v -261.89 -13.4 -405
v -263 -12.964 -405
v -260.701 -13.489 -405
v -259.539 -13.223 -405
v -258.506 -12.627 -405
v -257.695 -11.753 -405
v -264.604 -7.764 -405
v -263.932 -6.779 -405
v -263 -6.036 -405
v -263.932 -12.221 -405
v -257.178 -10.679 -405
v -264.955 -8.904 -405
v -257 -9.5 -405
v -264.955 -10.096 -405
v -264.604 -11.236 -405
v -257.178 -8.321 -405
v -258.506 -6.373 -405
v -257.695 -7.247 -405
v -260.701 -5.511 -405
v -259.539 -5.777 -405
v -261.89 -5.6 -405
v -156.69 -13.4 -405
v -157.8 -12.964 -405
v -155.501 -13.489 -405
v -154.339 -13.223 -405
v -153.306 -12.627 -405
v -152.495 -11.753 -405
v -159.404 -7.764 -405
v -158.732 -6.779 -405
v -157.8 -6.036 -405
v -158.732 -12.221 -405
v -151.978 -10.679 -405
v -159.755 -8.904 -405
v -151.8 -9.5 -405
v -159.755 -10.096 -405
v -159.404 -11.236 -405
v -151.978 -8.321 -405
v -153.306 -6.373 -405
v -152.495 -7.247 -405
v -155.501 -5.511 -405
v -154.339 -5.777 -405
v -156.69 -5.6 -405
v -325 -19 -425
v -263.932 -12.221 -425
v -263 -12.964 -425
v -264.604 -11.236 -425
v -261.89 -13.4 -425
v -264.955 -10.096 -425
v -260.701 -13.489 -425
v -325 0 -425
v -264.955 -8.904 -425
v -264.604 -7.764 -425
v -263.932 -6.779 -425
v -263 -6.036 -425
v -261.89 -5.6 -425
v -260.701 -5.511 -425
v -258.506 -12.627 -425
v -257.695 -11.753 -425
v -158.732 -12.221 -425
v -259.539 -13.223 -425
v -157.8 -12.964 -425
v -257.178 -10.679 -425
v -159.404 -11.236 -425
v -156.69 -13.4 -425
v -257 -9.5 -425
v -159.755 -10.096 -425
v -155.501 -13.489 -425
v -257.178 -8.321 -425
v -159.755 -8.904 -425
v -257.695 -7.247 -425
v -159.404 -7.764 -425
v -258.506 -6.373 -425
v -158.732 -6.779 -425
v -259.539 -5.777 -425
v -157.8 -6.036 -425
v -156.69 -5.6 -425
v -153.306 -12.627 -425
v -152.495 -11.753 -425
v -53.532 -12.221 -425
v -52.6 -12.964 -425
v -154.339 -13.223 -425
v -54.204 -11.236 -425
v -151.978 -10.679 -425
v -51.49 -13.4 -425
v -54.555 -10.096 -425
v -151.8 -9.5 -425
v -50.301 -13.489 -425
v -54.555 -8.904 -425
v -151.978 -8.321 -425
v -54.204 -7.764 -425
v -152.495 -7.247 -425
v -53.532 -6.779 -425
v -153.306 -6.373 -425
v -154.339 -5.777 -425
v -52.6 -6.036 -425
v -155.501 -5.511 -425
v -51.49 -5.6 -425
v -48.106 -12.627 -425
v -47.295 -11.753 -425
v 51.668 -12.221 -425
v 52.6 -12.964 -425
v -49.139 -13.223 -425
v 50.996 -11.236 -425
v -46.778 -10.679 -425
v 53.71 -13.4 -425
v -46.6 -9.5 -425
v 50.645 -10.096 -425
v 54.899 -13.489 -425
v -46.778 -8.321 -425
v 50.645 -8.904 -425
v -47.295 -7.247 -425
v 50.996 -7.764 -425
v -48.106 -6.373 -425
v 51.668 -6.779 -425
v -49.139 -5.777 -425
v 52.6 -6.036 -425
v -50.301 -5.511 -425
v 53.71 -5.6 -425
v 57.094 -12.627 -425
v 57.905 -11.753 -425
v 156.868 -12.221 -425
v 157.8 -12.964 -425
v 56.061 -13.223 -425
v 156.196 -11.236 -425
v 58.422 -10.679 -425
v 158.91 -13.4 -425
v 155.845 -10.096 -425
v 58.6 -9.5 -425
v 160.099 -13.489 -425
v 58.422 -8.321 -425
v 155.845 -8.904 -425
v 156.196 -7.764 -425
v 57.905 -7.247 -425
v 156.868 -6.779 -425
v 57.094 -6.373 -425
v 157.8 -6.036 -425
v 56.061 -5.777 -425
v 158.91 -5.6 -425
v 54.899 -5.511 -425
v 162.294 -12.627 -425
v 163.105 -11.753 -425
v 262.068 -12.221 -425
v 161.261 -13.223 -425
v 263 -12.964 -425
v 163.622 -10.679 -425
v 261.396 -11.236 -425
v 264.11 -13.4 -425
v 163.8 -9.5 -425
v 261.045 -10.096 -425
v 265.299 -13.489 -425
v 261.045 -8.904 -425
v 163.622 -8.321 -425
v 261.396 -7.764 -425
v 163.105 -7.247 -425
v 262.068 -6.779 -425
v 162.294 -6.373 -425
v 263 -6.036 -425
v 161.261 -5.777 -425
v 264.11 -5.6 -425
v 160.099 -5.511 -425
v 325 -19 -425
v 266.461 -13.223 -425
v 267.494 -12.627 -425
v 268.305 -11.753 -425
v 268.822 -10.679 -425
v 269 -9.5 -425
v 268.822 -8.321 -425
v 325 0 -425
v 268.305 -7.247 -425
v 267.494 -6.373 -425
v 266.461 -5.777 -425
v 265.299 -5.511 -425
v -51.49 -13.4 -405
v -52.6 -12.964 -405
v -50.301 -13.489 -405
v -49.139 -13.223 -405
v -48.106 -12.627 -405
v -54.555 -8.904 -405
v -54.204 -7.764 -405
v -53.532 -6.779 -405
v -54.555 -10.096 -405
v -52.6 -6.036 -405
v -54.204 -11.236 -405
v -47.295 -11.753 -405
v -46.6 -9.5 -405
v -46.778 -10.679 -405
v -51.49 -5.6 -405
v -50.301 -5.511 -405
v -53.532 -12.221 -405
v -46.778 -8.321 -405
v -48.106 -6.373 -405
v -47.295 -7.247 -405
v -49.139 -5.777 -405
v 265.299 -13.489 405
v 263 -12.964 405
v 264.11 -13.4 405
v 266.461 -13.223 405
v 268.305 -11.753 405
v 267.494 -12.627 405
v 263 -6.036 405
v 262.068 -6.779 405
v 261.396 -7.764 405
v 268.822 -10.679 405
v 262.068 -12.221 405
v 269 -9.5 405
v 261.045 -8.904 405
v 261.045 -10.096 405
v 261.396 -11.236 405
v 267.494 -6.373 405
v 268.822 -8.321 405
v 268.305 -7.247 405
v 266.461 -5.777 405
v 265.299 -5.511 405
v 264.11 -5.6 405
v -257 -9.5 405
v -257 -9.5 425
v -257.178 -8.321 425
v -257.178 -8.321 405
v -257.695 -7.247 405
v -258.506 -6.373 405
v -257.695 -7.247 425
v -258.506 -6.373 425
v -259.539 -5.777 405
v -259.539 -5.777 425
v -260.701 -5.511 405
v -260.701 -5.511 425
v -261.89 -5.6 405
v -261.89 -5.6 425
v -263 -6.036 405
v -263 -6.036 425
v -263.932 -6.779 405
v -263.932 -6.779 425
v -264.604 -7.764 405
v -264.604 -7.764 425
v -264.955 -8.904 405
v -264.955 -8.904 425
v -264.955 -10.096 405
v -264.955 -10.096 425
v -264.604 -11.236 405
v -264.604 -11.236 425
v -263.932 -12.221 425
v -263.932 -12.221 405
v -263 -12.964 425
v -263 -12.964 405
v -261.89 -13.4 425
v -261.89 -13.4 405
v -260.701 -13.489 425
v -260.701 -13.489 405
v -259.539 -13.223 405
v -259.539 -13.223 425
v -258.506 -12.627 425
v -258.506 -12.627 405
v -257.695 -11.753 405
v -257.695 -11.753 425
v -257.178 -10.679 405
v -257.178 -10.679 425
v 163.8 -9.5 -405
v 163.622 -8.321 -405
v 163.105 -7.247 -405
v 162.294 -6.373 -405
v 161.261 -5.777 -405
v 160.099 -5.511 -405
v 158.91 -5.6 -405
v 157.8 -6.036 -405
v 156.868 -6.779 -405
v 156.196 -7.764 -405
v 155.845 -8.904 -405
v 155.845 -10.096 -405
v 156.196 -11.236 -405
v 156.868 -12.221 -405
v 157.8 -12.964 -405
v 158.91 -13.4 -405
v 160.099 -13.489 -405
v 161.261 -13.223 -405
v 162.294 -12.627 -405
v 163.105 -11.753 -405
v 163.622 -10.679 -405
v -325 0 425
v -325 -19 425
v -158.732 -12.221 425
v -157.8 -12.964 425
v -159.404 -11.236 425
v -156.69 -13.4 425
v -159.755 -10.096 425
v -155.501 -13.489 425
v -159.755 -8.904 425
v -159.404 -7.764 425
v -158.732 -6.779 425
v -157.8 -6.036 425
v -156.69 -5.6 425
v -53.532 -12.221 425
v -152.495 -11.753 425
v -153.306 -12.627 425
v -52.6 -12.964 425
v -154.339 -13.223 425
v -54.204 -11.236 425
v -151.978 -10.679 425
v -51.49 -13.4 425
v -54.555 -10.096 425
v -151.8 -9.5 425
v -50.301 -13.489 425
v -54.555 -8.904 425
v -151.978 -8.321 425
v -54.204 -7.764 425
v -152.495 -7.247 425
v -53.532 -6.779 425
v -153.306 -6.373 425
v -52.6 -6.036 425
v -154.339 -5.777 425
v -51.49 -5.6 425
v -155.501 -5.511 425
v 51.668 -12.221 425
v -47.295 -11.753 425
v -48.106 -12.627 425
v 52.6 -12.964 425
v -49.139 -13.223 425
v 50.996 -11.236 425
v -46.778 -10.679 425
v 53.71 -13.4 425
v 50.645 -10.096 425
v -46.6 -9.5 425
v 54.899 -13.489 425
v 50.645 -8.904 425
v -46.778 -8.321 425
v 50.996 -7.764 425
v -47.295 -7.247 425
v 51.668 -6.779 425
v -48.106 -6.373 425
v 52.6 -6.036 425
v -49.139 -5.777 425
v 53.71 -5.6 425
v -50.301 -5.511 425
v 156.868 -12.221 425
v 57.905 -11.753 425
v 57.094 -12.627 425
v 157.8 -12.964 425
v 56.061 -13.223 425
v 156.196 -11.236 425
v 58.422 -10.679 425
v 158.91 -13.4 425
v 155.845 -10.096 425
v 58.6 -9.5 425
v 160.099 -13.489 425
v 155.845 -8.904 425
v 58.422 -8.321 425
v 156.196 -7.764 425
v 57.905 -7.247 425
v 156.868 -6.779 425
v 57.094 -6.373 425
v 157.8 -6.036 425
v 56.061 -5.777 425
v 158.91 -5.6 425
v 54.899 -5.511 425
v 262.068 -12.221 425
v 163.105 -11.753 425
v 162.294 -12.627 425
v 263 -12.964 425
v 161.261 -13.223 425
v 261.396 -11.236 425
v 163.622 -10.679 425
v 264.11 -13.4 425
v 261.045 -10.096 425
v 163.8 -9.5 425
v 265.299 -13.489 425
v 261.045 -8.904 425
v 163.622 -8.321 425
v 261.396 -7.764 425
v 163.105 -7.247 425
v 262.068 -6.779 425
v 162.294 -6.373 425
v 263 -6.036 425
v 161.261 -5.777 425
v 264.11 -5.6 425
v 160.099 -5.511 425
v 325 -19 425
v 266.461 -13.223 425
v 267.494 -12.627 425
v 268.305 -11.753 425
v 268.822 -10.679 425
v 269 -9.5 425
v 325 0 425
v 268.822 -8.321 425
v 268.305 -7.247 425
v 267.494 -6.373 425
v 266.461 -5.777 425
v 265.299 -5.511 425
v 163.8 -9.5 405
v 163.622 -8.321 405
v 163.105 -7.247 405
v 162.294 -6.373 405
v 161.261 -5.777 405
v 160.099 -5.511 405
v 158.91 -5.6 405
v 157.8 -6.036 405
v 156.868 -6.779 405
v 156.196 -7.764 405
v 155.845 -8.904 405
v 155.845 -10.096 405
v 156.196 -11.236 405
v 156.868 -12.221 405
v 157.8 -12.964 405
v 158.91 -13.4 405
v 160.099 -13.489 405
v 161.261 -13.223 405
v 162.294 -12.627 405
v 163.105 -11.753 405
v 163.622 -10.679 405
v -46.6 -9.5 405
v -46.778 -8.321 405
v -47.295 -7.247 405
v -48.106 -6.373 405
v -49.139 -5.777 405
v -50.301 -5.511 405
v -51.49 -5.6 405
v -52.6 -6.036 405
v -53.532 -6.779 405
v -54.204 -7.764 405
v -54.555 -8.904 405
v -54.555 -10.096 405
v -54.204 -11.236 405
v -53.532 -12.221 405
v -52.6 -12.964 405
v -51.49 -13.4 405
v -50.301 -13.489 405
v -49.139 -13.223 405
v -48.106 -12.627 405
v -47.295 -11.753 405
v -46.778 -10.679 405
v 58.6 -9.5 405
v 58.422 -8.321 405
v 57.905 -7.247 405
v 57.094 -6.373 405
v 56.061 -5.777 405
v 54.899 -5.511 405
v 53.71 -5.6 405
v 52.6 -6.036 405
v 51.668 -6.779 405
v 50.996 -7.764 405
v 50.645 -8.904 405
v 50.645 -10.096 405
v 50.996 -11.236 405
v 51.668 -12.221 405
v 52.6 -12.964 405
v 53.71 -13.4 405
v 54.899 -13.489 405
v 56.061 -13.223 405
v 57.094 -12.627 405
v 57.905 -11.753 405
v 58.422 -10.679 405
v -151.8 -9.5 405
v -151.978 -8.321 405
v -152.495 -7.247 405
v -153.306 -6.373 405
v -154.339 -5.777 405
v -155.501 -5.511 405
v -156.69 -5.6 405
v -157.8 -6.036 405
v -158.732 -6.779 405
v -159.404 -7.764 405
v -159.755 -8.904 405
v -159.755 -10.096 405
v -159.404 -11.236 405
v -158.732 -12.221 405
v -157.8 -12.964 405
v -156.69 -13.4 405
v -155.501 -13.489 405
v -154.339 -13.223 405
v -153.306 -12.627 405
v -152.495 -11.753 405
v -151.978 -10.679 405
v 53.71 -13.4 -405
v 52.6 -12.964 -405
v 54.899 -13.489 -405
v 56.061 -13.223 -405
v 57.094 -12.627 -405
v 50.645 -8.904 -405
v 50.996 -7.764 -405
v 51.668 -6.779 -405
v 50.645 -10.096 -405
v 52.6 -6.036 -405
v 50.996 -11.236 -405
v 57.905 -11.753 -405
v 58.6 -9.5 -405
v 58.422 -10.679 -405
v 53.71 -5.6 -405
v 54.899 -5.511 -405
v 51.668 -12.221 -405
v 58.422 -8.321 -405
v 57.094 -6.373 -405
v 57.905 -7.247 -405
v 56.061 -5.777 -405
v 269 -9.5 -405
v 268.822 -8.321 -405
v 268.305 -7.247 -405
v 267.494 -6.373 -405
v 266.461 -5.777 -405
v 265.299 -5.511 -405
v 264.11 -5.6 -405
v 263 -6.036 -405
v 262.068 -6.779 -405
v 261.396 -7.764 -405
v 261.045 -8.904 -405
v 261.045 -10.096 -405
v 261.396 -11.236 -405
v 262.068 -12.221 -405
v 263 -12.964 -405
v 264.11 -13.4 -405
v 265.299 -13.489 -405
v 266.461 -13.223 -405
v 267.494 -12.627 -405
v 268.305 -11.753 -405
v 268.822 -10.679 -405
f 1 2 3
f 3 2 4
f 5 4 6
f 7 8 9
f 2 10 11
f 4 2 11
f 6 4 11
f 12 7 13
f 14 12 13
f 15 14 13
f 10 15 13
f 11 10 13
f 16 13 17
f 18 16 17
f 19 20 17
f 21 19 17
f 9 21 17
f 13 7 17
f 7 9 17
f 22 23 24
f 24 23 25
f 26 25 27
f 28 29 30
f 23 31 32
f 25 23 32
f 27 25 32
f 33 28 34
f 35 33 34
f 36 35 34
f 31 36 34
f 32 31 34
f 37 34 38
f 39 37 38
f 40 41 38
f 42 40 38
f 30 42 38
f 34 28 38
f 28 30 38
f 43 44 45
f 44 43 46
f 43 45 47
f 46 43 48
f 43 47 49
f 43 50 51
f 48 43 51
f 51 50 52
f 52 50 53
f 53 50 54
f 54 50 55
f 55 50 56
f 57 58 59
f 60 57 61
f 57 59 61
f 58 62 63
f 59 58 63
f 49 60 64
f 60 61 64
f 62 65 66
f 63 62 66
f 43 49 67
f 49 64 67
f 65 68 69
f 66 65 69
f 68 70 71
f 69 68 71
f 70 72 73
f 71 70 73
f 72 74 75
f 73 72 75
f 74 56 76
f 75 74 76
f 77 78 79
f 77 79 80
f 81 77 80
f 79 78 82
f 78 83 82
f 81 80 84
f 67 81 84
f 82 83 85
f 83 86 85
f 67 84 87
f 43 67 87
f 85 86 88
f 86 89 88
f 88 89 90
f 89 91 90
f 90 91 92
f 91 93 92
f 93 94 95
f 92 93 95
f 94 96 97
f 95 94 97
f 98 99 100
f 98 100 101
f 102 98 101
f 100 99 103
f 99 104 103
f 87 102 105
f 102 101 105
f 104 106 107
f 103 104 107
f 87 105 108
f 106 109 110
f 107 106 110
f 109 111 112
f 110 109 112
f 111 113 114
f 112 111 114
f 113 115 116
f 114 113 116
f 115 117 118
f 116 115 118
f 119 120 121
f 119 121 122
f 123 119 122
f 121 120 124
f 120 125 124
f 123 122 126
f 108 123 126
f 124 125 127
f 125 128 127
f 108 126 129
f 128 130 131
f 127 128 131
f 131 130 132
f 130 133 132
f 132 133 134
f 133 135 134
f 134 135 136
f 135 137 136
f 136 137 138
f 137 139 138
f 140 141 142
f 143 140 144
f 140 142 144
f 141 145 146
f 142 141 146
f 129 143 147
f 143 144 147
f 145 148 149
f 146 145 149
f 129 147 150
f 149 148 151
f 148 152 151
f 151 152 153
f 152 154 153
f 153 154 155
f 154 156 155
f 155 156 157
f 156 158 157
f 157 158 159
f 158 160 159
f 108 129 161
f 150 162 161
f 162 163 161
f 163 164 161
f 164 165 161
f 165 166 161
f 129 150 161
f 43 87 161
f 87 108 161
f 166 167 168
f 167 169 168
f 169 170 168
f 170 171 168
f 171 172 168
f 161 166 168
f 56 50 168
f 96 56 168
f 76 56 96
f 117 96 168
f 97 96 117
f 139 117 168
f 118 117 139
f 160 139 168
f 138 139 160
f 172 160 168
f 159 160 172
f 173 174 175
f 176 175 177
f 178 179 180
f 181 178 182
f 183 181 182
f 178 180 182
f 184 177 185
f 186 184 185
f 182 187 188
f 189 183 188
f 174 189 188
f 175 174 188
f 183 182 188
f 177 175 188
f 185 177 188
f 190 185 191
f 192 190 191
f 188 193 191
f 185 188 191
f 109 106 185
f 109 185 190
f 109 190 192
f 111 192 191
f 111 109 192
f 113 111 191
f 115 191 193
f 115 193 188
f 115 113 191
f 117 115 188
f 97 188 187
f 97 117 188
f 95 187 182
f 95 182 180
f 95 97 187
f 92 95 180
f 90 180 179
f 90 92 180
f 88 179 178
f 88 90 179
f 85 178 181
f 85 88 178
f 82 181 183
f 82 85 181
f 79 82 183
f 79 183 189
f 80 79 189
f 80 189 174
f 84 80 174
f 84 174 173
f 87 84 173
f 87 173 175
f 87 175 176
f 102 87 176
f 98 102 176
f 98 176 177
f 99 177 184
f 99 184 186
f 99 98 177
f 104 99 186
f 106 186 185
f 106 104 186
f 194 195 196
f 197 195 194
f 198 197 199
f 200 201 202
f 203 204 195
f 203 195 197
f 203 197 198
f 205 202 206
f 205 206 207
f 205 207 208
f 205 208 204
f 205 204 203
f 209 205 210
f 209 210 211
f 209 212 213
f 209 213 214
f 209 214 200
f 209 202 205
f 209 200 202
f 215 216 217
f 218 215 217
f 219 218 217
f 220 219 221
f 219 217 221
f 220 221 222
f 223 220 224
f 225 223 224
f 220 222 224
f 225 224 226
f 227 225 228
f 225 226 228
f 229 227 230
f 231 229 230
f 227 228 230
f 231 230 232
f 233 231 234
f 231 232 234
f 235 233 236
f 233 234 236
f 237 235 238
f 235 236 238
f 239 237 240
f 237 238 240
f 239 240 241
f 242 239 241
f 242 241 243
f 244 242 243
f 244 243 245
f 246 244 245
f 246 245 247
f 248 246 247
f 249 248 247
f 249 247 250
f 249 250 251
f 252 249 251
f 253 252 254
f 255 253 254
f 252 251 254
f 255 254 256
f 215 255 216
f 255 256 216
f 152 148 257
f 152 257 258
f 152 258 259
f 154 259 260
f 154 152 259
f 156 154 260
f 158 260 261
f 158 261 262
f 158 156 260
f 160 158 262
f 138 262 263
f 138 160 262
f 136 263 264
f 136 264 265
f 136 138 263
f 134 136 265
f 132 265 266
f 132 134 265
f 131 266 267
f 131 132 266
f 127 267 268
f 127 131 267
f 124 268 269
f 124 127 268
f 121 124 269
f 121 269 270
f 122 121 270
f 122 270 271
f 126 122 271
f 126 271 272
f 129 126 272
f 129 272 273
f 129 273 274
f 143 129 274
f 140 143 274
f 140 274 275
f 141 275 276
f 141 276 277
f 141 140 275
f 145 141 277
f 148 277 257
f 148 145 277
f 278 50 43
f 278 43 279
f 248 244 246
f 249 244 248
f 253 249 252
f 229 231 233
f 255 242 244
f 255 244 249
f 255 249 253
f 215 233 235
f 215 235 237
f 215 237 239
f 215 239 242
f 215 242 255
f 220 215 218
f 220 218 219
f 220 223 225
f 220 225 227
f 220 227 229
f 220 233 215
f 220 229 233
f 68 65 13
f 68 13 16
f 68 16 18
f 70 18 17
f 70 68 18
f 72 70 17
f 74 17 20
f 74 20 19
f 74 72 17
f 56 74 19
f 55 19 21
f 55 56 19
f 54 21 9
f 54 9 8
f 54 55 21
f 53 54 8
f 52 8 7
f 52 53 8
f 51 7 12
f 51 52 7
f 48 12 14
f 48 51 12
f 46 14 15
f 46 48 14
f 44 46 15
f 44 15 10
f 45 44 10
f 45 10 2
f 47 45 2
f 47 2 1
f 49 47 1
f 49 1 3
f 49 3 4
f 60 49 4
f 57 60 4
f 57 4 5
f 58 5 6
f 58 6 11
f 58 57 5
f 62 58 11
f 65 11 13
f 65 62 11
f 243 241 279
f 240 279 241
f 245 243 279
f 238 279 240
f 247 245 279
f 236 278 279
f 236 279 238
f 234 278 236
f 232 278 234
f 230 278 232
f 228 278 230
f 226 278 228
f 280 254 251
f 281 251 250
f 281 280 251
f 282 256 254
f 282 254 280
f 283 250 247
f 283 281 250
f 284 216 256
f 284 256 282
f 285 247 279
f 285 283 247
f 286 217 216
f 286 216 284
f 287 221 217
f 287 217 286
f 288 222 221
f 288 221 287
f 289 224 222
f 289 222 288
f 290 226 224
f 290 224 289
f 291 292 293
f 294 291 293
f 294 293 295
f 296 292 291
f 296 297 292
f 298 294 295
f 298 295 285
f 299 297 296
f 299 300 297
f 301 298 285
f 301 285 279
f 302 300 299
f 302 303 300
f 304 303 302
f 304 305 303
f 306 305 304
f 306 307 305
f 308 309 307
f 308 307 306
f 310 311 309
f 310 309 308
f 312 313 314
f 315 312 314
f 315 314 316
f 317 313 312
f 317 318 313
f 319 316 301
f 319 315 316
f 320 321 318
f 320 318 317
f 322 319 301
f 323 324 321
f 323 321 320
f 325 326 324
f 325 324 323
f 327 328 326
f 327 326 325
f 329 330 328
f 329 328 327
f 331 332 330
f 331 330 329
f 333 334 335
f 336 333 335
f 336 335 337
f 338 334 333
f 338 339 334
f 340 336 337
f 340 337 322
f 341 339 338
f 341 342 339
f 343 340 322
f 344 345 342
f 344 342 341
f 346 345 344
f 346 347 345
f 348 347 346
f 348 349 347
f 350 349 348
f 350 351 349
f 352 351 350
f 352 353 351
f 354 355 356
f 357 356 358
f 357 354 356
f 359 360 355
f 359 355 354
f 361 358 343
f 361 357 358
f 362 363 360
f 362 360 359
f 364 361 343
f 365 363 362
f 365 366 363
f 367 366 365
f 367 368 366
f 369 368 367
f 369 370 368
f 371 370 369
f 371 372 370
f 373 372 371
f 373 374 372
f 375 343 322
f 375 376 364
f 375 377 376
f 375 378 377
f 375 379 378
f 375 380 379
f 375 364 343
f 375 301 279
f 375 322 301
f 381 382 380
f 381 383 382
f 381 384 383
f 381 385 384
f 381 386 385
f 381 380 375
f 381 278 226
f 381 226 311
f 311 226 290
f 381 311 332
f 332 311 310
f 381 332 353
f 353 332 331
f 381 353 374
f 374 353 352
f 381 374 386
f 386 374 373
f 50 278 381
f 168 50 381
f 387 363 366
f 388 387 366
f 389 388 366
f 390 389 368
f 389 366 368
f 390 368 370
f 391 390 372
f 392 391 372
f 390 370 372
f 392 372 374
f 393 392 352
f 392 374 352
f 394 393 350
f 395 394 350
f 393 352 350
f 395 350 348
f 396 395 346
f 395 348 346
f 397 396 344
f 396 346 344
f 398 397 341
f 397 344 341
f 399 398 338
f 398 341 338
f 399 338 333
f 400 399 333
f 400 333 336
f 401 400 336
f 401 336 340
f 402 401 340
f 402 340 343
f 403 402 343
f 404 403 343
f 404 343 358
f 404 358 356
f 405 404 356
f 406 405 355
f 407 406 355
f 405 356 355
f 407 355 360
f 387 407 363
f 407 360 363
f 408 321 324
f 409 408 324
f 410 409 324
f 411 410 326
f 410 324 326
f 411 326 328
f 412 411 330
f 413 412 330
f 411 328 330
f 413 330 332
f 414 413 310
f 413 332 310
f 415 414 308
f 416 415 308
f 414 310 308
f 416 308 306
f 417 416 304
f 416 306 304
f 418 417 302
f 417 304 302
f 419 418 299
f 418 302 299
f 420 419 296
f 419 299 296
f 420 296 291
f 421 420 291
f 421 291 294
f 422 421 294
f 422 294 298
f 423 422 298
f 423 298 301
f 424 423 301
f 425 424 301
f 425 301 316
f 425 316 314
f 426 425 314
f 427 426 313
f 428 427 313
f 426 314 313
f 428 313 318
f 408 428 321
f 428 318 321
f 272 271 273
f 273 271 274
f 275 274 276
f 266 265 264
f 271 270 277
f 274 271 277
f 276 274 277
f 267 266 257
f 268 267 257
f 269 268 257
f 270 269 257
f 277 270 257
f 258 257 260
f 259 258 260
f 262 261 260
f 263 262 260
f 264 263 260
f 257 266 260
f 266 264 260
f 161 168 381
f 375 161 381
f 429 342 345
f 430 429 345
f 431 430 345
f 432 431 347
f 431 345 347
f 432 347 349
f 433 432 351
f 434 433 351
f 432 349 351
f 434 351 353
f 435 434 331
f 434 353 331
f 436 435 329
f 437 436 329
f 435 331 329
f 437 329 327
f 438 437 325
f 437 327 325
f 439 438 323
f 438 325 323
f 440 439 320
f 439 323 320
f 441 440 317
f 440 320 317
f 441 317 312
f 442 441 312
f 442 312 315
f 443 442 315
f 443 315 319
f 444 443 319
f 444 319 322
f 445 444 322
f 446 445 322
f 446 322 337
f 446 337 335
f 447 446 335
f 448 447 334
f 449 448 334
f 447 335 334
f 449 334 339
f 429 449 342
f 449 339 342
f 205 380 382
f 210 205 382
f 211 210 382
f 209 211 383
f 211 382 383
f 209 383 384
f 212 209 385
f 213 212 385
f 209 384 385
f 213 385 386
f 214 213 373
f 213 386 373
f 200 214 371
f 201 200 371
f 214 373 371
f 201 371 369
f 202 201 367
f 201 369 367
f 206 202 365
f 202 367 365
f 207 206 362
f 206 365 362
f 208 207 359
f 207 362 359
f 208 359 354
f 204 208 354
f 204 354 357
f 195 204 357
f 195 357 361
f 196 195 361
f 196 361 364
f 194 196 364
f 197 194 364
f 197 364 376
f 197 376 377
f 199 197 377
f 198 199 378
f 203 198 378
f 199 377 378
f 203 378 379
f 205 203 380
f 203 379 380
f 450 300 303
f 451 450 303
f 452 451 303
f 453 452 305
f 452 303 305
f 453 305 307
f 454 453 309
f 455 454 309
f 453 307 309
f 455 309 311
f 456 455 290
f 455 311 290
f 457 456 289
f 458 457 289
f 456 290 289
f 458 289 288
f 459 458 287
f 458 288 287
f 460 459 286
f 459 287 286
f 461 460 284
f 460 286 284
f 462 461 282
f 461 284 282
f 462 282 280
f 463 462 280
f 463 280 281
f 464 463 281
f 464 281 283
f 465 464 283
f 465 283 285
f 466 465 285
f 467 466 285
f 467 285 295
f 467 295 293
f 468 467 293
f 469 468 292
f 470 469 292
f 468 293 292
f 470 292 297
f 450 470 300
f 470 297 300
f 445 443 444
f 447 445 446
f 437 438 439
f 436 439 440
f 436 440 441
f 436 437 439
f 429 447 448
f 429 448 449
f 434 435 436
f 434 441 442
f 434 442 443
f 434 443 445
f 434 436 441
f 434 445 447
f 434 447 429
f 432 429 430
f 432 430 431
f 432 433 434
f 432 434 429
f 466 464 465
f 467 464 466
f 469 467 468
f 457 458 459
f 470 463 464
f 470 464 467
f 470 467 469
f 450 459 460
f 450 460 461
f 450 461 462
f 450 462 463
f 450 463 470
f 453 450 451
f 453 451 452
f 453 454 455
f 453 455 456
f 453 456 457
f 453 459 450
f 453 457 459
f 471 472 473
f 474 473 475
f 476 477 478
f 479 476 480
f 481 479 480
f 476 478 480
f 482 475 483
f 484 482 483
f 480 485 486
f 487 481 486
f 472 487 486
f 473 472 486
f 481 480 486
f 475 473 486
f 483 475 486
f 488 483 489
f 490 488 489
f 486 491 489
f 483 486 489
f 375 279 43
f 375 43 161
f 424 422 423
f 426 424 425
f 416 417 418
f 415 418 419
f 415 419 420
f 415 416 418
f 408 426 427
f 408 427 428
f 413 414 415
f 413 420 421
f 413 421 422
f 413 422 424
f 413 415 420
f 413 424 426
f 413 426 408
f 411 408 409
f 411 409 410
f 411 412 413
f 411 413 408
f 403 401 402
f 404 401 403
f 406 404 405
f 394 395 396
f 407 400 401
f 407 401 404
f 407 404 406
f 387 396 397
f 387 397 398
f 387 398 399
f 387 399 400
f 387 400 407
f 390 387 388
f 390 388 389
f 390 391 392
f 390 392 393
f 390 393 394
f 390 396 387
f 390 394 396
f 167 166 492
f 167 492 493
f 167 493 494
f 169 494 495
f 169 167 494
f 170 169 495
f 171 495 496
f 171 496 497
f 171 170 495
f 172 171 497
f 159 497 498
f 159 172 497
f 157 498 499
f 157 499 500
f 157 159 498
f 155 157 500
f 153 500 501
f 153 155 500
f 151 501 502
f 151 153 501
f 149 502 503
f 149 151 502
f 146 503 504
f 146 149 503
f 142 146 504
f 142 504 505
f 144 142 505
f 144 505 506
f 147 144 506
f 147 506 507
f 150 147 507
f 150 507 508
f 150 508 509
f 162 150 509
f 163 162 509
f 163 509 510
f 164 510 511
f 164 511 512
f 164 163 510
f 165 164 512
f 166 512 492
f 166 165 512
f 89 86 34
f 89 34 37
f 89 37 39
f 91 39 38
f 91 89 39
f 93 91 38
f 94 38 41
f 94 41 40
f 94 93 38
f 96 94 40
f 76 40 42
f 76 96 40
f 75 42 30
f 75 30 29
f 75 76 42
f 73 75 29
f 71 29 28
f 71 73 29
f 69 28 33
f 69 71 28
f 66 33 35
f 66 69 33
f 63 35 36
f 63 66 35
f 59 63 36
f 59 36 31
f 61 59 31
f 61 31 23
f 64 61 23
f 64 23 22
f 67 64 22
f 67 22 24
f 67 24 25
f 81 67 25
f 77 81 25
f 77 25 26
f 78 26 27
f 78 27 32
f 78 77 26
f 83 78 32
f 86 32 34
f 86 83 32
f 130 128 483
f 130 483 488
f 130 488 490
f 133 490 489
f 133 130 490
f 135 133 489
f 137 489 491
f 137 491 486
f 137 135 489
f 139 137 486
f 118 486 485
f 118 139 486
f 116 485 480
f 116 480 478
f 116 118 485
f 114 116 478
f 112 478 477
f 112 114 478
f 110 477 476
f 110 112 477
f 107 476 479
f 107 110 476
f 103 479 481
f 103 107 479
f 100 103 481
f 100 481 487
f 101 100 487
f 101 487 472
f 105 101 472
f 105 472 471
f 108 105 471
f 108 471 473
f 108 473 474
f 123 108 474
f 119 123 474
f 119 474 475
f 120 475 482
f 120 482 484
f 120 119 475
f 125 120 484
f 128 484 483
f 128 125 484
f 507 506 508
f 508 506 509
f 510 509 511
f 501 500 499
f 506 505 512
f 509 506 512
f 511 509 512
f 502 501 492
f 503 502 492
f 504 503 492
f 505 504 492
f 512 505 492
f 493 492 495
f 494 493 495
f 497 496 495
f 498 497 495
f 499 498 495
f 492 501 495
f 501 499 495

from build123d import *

# Parameters (mm, degrees)
F0_W     = 650
F0_H     = 850
F1_DEPTH = 19
F2_R     = 4
F3_DEPTH = 20


# Not quite as in the source:
# - a pattern or mirror of a feature is missing from the dataset's text; its kind, count and spacing are read off the source's solid


with BuildPart() as f1:
    # F0 (on Front) → F1 (new body)
    with BuildSketch(Plane.XZ):
        Rectangle(F0_W, F0_H)
    extrude(amount=F1_DEPTH)

    # F2 (on face) → F3 (cut)
    with BuildSketch(Plane.XY.offset(425)):
        with Locations((265, -9.5)):
            Circle(F2_R)
        with Locations((159.8, -9.5)):
            Circle(F2_R)
        with Locations((54.6, -9.5)):
            Circle(F2_R)
        with Locations((-50.6, -9.5)):
            Circle(F2_R)
        with Locations((-155.8, -9.5)):
            Circle(F2_R)
        with Locations((-261, -9.5)):
            Circle(F2_R)
    f3 = extrude(amount=-F3_DEPTH, mode=Mode.SUBTRACT)

    # F3_copies: F3 across plane
    add(f3.mirror(Plane(origin=(0, 0, 0), x_dir=(-1, 0, 0), z_dir=(0, 0, -1))), mode=Mode.SUBTRACT)


solid = f1.part
